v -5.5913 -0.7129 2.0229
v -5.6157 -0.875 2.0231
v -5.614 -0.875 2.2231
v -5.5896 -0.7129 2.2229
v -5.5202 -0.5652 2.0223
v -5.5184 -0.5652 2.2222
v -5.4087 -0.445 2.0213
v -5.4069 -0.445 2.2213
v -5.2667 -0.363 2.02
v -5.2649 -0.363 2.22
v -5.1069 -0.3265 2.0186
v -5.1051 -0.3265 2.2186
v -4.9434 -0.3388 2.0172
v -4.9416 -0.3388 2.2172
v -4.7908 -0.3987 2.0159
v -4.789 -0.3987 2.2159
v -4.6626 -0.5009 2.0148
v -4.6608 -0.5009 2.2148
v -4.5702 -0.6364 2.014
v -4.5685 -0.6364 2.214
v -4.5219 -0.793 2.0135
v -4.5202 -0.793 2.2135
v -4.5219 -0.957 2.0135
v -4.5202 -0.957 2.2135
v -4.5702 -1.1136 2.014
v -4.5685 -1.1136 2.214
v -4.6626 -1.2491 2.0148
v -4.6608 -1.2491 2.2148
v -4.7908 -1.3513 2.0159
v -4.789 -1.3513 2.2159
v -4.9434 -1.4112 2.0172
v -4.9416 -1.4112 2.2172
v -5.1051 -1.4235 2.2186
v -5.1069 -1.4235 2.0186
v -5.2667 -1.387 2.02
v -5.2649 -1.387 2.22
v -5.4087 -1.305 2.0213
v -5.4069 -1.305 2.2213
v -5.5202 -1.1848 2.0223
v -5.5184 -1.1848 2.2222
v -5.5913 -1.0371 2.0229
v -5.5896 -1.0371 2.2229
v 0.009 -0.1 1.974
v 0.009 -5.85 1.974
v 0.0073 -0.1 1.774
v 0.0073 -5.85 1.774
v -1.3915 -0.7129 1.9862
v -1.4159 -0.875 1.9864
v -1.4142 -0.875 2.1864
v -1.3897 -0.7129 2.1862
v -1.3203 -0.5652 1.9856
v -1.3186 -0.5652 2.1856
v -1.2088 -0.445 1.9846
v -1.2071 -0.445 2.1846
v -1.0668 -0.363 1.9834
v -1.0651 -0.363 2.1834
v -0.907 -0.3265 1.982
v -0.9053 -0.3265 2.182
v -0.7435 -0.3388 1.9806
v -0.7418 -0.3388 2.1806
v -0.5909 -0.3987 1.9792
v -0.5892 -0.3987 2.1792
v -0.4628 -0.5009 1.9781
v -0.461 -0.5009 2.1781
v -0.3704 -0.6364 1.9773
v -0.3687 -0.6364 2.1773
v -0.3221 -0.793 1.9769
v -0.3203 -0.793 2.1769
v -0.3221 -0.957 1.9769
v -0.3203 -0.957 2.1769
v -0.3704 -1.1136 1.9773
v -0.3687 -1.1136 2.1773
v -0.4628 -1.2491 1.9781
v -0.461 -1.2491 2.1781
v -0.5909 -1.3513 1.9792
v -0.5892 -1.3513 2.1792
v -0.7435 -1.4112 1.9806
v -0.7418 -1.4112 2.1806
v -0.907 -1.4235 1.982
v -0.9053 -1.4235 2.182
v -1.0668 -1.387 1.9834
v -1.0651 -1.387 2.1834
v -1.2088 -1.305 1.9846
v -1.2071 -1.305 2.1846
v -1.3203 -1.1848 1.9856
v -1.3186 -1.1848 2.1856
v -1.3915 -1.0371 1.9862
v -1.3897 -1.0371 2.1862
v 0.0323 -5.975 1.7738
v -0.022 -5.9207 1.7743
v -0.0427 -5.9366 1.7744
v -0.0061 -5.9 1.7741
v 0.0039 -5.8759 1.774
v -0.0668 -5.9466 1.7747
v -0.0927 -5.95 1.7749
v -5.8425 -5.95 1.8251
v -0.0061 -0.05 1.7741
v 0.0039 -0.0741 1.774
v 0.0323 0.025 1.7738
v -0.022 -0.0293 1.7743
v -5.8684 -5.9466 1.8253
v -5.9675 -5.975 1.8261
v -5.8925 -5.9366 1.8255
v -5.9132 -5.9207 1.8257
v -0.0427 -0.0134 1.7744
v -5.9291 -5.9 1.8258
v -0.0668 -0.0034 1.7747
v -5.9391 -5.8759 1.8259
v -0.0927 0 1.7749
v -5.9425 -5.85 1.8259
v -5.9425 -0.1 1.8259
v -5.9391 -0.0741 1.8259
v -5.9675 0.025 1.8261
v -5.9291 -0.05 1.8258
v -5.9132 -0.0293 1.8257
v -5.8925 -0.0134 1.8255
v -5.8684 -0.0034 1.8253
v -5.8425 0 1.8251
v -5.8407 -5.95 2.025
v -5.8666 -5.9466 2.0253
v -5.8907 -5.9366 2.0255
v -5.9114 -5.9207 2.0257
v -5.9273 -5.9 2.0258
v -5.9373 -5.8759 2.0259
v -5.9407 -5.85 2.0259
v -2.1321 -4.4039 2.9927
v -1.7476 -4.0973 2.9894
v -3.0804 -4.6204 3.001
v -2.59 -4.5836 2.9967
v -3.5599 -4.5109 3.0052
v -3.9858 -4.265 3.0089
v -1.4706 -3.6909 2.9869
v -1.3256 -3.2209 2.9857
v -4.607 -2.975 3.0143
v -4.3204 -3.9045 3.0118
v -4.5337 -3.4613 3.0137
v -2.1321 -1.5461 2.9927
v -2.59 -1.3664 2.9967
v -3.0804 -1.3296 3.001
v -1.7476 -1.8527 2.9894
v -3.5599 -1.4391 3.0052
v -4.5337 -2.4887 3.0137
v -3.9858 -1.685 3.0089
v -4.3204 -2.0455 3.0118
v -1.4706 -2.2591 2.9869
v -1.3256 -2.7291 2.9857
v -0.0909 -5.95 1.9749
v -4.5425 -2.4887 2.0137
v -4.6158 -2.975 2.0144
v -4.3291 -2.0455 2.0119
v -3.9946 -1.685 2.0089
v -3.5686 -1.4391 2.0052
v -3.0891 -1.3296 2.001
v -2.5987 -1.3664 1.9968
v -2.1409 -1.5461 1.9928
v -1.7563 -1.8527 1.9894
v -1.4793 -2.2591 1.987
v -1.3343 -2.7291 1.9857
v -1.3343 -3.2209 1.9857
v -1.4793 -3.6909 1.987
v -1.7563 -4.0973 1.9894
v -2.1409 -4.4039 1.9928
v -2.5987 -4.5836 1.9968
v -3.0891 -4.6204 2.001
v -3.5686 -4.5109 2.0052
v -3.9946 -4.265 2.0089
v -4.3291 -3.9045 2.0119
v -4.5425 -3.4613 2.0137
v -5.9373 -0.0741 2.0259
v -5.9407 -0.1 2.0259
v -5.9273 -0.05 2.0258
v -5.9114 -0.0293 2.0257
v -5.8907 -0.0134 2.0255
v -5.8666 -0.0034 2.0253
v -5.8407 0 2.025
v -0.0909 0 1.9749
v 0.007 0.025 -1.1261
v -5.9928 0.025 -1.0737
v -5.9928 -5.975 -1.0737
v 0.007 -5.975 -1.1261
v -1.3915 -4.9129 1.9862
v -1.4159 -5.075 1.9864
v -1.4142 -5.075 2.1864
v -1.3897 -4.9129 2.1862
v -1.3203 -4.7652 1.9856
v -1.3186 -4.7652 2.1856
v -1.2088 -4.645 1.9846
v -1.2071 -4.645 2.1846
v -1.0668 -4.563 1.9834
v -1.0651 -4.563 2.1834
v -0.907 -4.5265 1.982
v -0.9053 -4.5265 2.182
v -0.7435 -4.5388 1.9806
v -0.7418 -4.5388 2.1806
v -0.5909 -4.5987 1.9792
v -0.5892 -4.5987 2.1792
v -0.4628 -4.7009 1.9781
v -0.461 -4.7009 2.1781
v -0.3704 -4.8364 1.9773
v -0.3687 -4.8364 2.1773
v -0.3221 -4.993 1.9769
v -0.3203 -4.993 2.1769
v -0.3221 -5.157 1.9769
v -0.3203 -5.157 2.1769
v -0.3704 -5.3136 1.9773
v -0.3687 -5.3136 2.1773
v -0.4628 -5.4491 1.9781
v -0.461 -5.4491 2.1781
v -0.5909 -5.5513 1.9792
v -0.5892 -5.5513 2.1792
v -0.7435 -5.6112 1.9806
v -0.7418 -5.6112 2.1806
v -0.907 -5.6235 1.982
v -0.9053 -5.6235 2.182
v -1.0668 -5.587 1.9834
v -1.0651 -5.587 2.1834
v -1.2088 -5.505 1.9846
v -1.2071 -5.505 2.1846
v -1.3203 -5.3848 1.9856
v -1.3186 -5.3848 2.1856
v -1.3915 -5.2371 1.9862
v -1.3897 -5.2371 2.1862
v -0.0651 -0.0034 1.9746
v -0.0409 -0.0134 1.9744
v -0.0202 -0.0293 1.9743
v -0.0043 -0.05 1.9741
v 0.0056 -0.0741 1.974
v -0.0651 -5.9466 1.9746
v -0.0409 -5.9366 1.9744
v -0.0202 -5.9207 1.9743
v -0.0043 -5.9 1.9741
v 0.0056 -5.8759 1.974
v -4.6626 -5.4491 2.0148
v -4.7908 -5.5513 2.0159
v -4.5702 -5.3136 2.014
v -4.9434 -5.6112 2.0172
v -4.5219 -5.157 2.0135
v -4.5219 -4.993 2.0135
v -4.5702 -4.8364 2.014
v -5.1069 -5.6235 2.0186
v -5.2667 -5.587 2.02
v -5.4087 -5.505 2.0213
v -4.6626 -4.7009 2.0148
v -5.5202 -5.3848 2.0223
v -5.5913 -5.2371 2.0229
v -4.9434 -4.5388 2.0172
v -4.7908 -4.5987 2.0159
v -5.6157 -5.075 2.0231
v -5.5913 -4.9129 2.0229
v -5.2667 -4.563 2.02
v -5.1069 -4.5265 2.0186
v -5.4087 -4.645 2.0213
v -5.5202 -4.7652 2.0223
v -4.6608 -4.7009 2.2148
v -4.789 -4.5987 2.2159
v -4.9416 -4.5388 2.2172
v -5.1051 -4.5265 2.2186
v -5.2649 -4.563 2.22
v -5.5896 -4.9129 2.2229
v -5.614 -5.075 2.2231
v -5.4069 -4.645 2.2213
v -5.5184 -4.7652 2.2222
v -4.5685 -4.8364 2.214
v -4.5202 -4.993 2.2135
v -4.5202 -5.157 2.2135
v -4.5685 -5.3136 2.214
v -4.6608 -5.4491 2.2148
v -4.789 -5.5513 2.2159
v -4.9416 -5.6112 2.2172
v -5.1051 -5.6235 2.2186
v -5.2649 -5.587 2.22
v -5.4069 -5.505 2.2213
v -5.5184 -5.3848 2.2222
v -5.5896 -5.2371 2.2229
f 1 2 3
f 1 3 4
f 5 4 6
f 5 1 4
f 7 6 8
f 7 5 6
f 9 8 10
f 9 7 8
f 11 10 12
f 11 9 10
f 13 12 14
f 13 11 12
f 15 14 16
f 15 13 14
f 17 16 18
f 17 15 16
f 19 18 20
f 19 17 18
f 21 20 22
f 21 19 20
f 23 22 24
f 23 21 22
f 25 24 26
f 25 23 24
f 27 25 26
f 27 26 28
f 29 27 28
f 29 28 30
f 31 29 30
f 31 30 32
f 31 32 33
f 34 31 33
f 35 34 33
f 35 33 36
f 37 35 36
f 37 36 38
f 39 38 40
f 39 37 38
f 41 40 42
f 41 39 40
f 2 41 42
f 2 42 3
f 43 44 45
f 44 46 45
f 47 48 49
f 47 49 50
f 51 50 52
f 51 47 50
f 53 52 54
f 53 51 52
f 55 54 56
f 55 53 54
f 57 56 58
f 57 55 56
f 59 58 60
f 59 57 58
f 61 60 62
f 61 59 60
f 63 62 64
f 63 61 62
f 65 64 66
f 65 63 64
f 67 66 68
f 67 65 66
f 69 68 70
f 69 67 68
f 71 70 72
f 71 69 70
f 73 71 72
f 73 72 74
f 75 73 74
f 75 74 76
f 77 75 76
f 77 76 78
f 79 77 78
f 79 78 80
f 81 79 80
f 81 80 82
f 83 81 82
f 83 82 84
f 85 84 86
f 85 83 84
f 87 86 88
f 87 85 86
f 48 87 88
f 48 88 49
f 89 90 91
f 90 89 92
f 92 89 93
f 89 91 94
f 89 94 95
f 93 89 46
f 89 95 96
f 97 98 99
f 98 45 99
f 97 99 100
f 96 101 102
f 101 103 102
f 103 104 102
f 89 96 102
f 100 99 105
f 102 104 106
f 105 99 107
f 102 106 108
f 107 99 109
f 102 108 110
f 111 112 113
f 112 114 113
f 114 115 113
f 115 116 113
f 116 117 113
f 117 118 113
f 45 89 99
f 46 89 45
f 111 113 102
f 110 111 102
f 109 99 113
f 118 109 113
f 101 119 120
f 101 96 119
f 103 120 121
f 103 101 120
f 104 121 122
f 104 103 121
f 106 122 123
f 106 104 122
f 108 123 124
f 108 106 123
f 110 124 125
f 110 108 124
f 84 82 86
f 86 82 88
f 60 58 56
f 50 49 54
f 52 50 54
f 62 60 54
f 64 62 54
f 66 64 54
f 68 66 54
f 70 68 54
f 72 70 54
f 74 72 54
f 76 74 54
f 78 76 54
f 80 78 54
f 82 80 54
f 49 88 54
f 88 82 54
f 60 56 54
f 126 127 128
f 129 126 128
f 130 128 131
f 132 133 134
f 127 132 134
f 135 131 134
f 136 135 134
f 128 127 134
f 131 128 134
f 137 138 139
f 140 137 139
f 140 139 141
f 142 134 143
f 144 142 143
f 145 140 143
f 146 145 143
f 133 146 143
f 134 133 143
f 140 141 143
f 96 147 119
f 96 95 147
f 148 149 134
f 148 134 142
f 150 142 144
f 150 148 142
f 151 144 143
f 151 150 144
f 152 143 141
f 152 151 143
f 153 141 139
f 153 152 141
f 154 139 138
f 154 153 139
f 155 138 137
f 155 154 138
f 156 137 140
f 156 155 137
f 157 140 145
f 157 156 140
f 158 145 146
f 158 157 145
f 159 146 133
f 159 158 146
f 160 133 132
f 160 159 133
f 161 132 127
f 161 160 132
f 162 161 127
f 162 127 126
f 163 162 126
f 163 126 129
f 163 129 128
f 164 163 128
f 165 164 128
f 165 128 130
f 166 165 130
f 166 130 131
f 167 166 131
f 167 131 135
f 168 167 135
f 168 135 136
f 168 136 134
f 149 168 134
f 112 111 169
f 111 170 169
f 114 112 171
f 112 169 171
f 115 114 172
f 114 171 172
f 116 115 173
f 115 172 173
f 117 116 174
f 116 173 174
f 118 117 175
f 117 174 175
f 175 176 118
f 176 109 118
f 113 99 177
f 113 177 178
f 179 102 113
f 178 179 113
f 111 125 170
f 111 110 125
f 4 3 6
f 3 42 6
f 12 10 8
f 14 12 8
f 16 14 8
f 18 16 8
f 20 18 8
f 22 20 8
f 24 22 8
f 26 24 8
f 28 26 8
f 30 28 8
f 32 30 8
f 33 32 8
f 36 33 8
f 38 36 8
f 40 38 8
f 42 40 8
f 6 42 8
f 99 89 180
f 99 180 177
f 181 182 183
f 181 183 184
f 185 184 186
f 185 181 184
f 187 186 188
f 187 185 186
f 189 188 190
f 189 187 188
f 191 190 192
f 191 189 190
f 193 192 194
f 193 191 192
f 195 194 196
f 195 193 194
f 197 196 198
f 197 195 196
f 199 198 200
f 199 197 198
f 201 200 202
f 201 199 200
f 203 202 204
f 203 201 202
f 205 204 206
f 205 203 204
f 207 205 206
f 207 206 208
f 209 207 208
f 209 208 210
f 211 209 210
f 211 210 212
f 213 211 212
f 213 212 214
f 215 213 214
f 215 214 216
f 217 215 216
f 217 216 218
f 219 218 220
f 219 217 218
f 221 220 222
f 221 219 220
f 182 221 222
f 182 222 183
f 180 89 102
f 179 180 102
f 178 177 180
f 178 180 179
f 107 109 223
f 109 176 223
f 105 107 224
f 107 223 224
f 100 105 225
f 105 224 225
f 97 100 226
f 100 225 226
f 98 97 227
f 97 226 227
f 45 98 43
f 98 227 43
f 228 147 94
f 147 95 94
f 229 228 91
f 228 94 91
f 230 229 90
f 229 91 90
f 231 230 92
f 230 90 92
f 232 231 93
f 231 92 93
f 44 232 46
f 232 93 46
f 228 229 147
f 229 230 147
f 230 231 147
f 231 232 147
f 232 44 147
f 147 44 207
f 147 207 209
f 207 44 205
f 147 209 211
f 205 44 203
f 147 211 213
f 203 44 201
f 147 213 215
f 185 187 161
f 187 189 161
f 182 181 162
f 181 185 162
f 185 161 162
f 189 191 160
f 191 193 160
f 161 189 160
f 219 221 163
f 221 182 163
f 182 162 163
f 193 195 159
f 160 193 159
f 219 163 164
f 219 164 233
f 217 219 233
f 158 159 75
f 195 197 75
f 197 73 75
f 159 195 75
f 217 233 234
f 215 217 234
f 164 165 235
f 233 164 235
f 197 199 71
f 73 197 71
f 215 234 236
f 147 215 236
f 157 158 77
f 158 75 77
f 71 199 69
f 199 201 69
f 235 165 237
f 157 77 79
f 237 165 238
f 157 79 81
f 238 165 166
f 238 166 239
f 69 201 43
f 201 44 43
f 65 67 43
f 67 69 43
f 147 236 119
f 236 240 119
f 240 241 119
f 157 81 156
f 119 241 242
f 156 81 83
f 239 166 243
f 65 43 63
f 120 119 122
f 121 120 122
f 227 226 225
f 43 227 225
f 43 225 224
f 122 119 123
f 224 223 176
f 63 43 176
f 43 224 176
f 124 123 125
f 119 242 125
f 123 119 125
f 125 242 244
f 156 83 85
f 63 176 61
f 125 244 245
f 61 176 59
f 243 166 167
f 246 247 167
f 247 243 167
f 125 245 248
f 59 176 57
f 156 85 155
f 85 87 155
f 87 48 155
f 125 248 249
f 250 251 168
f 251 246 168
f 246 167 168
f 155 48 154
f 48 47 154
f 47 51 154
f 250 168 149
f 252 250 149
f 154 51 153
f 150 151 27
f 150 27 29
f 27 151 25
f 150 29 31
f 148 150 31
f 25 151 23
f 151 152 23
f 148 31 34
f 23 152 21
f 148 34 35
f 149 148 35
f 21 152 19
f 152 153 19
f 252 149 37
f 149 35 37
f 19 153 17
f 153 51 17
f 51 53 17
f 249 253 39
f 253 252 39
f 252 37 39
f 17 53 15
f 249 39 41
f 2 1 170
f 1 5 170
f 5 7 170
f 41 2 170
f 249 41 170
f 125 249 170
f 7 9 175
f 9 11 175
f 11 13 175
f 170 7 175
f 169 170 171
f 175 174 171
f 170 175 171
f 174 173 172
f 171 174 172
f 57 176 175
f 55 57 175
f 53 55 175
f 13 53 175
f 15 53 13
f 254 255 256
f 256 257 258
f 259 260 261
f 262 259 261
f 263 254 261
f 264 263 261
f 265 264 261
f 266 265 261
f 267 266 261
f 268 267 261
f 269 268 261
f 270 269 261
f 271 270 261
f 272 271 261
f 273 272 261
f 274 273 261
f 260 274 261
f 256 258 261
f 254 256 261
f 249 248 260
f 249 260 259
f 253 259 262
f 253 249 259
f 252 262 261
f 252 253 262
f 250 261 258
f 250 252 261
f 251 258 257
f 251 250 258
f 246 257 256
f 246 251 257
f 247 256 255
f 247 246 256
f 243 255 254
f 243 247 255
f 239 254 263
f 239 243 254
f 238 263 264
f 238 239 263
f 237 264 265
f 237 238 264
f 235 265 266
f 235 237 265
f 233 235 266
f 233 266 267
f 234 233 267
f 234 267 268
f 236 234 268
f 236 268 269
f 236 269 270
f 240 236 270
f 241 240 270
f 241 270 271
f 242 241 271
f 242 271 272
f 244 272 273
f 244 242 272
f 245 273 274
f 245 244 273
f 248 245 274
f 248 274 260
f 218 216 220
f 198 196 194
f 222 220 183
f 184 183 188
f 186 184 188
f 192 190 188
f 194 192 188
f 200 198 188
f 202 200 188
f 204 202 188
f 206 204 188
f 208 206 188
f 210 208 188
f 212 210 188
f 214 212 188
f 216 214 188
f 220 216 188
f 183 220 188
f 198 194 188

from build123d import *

# Parameters (mm, degrees)
SKETCH1_W             = 5.95
SKETCH1_H             = 5.95
BOSS_EXTRUDE1_DEPTH   = 0.1
BOSS_EXTRUDE2_START   = 0.1
SKETCH2_W             = 6
SKETCH2_H             = 6
BOSS_EXTRUDE2_DEPTH   = 2.9
FILLET1_R             = 0.1
BOSS_EXTRUDE3_START   = -0.1
SKETCH3_R             = 1.65
SKETCH3_R_2           = 0.55
BOSS_EXTRUDE3_DEPTH   = 0.2
BOSS_EXTRUDE4_START   = -0.1
SKETCH4_R             = 1.65
BOSS_EXTRUDE4_DEPTH   = 1
BODY_MOVE_COPY1_ANGLE = 179.5


with BuildPart() as part:
    # Sketch1 → Boss-Extrude1 (new body, symmetric)
    with BuildSketch(Plane.XY):
        with Locations((-2.975, -2.975)):
            Rectangle(SKETCH1_W, SKETCH1_H)
    extrude(amount=BOSS_EXTRUDE1_DEPTH, both=True)

    # Sketch2 → Boss-Extrude2 (add)
    with BuildSketch(Plane.XY.offset(BOSS_EXTRUDE2_START)):
        with Locations((-2.975, -2.975)):
            Rectangle(SKETCH2_W, SKETCH2_H)
    extrude(amount=BOSS_EXTRUDE2_DEPTH)

    # Fillet1
    fillet1_edges = [part.edges().sort_by_distance(p)[0] for p in [
        (0, -5.95, 0),
        (-5.95, -5.95, 0),
        (-5.95, 0, 0),
        (0, 0, 0),
    ]]
    fillet(fillet1_edges, radius=FILLET1_R)

    # Sketch3 → Boss-Extrude3 (add)
    with BuildSketch(Plane.XY.offset(BOSS_EXTRUDE3_START)):
        with Locations((-2.975, -2.975)):
            Circle(SKETCH3_R)
        with Locations((-5.075, -0.875)):
            Circle(SKETCH3_R_2)
        with Locations((-5.075, -5.075)):
            Circle(SKETCH3_R_2)
        with Locations((-0.875, -5.075)):
            Circle(SKETCH3_R_2)
        with Locations((-0.875, -0.875)):
            Circle(SKETCH3_R_2)
    extrude(amount=-BOSS_EXTRUDE3_DEPTH)

    # Sketch4 → Boss-Extrude4 (add)
    with BuildSketch(Plane.XY.offset(BOSS_EXTRUDE4_START)):
        with Locations((-2.975, -2.975)):
            Circle(SKETCH4_R)
    extrude(amount=-BOSS_EXTRUDE4_DEPTH)


with BuildPart() as part_1:
    # Body-Move/Copy1: moved
    add(part.part.rotate(Axis((-2.975, 0, 0.95), (0, -1, 0)), BODY_MOVE_COPY1_ANGLE))


solid = part_1.part
